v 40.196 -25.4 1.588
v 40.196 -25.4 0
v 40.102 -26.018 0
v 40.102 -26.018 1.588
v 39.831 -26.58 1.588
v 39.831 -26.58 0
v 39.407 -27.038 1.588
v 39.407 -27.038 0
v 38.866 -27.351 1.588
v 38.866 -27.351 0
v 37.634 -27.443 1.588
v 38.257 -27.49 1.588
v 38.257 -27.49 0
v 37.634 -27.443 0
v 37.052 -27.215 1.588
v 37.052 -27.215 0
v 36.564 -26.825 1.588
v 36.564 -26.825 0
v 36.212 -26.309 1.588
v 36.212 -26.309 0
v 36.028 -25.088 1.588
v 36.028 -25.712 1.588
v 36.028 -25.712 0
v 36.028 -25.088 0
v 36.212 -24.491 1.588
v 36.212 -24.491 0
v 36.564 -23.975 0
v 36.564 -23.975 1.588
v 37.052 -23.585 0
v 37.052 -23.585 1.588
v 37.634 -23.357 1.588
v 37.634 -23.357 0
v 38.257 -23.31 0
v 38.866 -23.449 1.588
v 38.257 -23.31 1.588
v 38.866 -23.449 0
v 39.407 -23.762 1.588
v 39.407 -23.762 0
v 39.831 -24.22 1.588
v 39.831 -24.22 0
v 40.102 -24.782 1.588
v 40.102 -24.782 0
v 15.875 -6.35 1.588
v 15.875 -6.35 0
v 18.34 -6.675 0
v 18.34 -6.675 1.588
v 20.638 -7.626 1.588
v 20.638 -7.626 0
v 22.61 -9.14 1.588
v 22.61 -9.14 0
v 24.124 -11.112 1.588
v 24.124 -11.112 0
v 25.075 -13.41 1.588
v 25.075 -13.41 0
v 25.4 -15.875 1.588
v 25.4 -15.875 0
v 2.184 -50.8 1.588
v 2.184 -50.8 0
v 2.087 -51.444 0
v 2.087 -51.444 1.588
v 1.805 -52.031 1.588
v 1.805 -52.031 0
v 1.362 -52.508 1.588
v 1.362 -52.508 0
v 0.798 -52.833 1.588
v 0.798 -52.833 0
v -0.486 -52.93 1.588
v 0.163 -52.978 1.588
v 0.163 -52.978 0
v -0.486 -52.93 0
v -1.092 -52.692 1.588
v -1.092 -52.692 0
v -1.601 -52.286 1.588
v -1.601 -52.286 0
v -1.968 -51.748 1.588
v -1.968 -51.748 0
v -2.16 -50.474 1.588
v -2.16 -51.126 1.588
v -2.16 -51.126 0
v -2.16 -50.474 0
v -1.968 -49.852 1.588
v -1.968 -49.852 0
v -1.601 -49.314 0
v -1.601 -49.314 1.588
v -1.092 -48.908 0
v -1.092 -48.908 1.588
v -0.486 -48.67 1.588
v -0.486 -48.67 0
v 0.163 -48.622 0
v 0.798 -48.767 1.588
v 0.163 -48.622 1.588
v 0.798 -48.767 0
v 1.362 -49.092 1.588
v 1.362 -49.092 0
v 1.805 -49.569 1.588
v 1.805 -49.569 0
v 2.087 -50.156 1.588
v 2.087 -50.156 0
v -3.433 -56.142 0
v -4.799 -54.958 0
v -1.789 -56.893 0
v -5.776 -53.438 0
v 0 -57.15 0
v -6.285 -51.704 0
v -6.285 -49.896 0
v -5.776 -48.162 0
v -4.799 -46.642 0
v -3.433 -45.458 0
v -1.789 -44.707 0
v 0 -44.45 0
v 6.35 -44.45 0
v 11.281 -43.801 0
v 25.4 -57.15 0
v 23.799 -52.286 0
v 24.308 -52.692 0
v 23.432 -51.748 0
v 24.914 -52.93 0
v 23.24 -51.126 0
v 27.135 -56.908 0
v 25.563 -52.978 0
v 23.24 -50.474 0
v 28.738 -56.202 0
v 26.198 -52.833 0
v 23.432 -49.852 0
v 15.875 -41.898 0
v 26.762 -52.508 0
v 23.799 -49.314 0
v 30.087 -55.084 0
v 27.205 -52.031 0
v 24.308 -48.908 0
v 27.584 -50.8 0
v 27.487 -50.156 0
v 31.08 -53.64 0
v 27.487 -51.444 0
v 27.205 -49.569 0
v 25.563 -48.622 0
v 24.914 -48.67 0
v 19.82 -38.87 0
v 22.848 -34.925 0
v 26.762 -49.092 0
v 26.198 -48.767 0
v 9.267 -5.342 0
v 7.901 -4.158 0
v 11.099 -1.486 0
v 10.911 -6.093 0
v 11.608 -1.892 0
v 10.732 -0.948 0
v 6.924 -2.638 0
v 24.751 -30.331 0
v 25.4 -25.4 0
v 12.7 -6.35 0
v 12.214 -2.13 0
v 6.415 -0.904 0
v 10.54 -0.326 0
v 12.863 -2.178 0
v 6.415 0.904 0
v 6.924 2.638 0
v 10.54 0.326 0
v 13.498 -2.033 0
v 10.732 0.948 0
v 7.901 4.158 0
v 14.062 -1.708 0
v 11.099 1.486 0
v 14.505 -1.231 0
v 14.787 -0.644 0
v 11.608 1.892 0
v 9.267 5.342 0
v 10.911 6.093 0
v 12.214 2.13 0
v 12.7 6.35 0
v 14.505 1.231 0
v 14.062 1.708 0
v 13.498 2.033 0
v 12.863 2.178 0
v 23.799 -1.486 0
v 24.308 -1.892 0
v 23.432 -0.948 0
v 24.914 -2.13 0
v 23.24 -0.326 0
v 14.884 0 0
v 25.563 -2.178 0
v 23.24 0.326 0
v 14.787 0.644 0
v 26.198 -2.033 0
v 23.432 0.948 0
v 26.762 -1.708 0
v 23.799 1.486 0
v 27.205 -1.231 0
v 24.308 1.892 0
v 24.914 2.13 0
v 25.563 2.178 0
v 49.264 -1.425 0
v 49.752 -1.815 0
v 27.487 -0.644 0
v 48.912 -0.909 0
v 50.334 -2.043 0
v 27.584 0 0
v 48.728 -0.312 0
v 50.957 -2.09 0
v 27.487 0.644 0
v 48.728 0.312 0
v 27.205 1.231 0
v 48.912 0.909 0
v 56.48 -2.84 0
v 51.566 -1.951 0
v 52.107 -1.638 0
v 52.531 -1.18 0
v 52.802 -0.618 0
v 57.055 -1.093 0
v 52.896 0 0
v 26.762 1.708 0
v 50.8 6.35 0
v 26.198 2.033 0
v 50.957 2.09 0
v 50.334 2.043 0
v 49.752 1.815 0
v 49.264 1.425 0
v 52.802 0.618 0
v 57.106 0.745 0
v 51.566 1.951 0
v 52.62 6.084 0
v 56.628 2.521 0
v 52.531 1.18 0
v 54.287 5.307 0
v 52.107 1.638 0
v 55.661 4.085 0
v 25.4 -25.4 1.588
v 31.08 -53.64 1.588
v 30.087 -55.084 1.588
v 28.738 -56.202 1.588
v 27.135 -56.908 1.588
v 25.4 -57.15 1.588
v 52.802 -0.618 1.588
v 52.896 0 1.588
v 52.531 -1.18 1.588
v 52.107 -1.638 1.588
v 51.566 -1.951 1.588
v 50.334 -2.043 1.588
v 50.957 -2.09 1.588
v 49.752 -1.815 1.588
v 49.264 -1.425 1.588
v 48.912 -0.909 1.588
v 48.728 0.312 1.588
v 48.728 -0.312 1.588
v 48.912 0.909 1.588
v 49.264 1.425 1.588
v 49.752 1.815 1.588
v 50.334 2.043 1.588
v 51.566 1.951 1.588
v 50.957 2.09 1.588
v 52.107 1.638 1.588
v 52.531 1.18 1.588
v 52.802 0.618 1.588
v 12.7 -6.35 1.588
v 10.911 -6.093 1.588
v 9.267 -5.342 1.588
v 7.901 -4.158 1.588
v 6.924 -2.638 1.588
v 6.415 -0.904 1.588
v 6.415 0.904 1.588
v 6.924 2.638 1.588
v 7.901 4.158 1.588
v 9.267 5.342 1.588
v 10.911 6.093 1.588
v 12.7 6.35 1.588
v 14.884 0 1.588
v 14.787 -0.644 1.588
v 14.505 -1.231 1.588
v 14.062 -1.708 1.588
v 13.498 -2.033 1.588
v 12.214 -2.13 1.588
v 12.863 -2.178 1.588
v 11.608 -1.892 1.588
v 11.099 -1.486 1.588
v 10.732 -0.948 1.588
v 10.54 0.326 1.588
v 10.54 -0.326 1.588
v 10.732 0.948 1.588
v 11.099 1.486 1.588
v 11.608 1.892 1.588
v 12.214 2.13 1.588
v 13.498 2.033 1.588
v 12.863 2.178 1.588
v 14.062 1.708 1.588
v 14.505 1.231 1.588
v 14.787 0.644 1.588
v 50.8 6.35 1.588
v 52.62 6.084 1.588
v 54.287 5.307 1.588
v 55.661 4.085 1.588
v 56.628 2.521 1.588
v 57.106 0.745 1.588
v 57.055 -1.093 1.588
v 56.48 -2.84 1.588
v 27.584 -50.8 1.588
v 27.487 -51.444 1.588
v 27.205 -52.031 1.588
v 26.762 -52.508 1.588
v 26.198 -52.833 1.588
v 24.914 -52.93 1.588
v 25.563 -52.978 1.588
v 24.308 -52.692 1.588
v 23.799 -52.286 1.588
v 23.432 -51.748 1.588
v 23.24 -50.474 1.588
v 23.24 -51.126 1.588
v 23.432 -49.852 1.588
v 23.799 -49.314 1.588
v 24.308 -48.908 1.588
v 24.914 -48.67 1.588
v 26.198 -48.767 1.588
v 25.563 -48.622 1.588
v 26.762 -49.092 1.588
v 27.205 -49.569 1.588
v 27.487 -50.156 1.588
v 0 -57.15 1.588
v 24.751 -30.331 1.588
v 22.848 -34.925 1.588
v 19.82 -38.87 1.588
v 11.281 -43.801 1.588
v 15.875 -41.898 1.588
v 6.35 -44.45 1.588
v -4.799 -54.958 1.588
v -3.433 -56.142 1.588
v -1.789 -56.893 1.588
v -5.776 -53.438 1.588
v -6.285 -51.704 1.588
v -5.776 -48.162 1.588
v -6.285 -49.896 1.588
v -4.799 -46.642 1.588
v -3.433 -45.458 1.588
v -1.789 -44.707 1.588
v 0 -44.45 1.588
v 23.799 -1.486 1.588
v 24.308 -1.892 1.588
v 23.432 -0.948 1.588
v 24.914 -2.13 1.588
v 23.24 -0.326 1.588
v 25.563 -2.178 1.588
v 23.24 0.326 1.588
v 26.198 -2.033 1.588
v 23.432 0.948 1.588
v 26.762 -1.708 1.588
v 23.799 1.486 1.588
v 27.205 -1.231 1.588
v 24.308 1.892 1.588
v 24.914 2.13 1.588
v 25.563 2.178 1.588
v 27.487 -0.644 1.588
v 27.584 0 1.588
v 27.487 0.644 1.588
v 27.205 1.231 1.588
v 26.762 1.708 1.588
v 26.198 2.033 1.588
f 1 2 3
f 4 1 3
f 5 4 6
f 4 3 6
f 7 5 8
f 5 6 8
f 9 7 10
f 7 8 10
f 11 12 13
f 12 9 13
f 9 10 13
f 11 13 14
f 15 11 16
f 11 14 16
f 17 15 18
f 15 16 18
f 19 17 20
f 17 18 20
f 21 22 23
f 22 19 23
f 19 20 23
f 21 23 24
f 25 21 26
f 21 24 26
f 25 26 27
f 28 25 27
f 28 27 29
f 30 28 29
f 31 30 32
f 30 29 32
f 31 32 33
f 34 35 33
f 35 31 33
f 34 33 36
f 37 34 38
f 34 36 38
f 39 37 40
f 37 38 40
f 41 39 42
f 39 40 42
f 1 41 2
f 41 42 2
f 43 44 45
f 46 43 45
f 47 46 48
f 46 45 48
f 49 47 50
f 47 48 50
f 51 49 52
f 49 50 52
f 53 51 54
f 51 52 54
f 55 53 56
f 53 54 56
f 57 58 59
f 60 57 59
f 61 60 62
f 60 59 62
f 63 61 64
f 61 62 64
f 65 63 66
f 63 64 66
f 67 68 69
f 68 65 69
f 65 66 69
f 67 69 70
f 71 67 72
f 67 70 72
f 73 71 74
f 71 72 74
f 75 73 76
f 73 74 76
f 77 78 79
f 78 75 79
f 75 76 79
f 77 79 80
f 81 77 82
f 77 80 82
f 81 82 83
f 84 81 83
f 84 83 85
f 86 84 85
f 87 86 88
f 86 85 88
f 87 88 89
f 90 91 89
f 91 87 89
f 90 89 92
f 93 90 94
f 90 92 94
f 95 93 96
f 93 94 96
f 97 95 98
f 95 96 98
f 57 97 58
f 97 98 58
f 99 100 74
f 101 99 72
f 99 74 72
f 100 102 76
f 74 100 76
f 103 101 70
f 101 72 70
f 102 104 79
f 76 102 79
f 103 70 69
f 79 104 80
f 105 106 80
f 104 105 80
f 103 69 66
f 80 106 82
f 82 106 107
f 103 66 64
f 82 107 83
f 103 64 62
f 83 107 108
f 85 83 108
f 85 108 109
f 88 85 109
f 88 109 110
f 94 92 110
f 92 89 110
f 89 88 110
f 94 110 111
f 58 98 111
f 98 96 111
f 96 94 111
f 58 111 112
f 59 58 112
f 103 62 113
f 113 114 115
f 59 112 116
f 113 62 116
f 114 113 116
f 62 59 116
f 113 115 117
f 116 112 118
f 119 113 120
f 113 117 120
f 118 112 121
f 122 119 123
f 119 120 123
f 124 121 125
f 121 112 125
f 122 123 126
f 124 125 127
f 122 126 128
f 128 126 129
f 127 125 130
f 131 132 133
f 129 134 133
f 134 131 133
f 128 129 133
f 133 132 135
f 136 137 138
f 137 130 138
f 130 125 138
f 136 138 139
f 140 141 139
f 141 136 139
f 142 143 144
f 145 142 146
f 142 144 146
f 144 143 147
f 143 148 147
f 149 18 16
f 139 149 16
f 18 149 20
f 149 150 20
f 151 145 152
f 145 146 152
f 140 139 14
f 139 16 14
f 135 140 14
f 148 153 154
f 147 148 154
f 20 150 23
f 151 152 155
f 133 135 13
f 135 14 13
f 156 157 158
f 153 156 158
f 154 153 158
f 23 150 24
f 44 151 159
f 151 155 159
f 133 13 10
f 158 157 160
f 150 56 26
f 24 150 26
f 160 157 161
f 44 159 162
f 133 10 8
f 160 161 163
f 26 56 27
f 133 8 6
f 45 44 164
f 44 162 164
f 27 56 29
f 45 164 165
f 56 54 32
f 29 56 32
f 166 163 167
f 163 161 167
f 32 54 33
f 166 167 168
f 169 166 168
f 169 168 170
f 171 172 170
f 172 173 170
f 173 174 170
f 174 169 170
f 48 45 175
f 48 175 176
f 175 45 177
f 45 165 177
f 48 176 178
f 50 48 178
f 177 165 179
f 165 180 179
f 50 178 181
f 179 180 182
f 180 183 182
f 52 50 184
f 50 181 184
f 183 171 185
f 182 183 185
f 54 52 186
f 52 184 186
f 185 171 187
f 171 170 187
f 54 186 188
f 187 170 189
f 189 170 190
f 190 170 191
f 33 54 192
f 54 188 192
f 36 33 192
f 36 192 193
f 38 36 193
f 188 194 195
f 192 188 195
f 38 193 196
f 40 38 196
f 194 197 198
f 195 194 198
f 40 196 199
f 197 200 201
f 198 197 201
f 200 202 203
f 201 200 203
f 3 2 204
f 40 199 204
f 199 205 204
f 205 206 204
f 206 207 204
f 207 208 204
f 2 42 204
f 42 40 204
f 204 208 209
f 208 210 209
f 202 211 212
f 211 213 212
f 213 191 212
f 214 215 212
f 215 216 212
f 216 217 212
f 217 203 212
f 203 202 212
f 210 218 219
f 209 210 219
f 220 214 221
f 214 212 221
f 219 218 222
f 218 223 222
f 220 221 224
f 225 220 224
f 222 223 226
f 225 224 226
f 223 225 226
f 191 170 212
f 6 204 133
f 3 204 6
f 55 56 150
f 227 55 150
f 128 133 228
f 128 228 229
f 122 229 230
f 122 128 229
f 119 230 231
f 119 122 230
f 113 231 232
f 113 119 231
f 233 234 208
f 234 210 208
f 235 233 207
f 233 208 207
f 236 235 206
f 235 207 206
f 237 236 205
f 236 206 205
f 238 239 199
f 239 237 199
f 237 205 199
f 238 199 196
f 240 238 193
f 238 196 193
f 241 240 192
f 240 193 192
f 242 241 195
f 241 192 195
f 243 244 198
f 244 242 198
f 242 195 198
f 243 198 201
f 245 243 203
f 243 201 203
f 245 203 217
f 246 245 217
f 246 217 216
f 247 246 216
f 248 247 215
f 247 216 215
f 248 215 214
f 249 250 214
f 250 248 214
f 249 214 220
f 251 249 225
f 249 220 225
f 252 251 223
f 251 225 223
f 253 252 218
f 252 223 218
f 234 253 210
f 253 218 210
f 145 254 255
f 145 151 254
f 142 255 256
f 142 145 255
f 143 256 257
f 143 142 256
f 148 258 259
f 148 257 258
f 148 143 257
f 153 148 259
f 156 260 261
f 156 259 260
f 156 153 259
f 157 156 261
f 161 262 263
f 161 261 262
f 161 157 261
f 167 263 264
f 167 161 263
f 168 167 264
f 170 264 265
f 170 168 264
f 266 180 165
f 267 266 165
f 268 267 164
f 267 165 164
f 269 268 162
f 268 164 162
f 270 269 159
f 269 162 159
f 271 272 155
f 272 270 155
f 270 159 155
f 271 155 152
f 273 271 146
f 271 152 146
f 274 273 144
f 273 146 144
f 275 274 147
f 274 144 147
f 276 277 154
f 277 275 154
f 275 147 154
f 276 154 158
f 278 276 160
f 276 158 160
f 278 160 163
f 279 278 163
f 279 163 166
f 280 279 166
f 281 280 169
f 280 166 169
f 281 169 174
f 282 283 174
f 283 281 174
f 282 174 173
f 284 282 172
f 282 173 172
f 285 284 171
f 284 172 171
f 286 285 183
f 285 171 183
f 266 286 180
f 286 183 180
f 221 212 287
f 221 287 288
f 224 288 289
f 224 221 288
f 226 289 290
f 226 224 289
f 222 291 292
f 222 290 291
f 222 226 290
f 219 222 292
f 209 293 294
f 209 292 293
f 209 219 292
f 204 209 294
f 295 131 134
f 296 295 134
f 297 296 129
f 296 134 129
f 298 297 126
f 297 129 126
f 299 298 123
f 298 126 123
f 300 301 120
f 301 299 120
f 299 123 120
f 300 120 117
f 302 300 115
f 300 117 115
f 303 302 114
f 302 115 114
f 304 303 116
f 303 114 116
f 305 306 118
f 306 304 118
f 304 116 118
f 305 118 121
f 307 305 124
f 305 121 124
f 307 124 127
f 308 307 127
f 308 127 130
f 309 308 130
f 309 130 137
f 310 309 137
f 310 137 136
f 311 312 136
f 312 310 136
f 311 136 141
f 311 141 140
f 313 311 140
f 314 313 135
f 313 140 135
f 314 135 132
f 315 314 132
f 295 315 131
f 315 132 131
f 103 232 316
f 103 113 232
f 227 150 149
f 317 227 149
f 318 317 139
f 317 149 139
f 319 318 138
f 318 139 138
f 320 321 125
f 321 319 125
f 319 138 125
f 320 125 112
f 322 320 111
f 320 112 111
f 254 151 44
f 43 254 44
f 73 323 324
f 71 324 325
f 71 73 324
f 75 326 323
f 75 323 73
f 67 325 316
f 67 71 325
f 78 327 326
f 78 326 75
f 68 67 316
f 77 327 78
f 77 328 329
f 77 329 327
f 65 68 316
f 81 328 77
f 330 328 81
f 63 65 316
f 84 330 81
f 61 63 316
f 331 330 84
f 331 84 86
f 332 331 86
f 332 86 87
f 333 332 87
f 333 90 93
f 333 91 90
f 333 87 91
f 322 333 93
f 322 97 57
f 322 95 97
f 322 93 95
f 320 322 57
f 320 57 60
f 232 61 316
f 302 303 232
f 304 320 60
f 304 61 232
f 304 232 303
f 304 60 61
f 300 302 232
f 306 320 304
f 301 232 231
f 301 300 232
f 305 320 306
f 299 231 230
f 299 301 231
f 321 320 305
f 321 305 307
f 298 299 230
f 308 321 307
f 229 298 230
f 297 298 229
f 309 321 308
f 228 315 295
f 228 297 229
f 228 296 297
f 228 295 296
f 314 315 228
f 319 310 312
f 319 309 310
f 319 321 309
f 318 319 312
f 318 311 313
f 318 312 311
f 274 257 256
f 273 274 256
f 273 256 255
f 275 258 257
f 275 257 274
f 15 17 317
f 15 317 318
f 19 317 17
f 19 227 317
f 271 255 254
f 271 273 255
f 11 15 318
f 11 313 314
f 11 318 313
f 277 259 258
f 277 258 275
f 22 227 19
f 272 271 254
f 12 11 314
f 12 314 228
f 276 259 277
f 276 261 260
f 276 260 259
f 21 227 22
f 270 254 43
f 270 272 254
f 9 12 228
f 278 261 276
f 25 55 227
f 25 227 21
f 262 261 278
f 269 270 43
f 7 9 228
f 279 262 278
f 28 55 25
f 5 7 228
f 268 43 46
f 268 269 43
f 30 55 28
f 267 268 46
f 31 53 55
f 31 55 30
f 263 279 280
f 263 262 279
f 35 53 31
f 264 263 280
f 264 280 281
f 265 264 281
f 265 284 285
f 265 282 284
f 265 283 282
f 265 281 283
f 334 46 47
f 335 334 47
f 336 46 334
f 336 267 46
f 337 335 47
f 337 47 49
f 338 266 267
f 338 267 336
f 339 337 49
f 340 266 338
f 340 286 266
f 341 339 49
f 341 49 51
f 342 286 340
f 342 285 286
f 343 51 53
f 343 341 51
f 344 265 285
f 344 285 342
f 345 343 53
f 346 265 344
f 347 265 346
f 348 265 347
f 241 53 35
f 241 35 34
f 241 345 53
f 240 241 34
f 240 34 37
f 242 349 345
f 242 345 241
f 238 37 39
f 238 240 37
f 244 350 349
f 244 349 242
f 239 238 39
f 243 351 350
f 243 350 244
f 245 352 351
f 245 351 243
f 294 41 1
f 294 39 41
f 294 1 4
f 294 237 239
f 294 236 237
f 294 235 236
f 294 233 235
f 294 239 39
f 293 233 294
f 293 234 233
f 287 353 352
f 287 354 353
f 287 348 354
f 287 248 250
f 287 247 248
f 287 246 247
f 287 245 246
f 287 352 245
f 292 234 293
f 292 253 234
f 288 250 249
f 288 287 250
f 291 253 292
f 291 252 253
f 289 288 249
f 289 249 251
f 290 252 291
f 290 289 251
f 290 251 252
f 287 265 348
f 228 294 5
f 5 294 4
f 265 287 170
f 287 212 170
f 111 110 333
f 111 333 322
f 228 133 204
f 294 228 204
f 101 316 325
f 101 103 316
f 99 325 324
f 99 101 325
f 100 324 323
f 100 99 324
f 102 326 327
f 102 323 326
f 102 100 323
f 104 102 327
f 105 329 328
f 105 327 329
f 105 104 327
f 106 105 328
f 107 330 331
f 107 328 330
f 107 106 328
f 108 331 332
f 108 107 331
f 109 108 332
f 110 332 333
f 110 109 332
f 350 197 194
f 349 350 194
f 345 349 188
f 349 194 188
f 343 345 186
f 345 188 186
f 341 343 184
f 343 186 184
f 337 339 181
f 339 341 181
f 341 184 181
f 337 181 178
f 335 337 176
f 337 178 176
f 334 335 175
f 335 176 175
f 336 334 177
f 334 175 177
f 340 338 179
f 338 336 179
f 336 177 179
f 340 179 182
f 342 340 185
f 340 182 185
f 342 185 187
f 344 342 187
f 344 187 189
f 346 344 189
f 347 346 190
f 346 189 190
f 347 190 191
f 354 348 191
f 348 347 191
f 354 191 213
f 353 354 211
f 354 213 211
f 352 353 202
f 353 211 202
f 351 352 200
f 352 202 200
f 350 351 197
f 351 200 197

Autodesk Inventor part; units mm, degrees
ref_plane "YZ Plane" through (0, 0, 0) normal (1, 0, 0) x (0, 1, 0)
ref_plane "XZ Plane" through (0, 0, 0) normal (0, 1, 0) x (-1, 0, 0)
ref_plane "XY Plane" through (0, 0, 0) normal (0, 0, 1) x (1, 0, 0)
sketch "main" plane through (0, 0, 0) normal (0, 0, 1) x (1, 0, 0)
  circle A0 centre (20.1733, 30.7236) radius 2.0955
  arc A1 (-24.2767, -13.7264) -> (-5.2267, 5.3236) centre (-24.2767, 5.3236) ccw
  line L0 (-5.2267, 14.8486) -> (-5.2267, 5.3236)
  line L1 (0.4529, -22.9162) -> (25.8529, 27.8838)
  arc A2 (-5.2267, 14.8486) -> (-14.7517, 24.3736) centre (-14.7517, 14.8486) ccw
  line L2 (-17.9267, 24.3736) -> (-14.7517, 24.3736)
  arc A3 (25.8529, 27.8838) -> (20.1733, 37.0736) centre (20.1733, 30.7236) ccw
  line L3 (20.1733, 37.0736) -> (-17.9267, 37.0736)
  line L4 (-30.6267, -13.7264) -> (-24.2767, -13.7264)
  circle A4 centre (-5.2267, -20.0764) radius 2.1844
  arc A5 (-5.2267, -26.4264) -> (0.4529, -22.9162) centre (-5.2267, -20.0764) ccw
  line L5 (-5.2267, -26.4264) -> (-30.6267, -26.4264)
  line L6 (-5.2267, -26.4264) -> (-30.6267, -26.4264)
  circle A6 centre (-30.6267, -20.0764) radius 2.1844
  arc A7 (-30.6267, -13.7264) -> (-30.6267, -26.4264) centre (-30.6267, -20.0764) ccw
  circle A8 centre (-5.2267, 30.7236) radius 2.1844
  circle A9 centre (7.4733, 5.3236) radius 2.0955
  arc A10 (-17.9267, 37.0736) -> (-17.9267, 24.3736) centre (-17.9267, 30.7236) ccw
  circle A11 centre (-17.9267, 30.7236) radius 2.1844
  point P0 (-10.623, 1.8831)
  point P1 (-5.2267, -13.7264)
  dimension "d0" = 12.7
  dimension "d1" = 12.7
  dimension "d2" = 4.3688
  dimension "d3" = 19.05
  dimension "d4" = 9.525
  dimension "d7" = 4.3688
  dimension "d8" = 4.191
  dimension "d10" = 4.191
sketch "Sketch1" plane through (0, 0, 0) normal (0, 0, 1) x (1, 0, 0)
  circle A0 centre (50.8, 0) radius 2.0955
  arc A1 (6.35, -44.45) -> (25.4, -25.4) centre (6.35, -25.4) ccw
  line L0 (25.4, -15.875) -> (25.4, -25.4)
  line L1 (31.0796, -53.6398) -> (56.4796, -2.8398)
  arc A2 (25.4, -15.875) -> (15.875, -6.35) centre (15.875, -15.875) ccw
  line L2 (12.7, -6.35) -> (15.875, -6.35)
  arc A3 (56.4796, -2.8398) -> (50.8, 6.35) centre (50.8, 0) ccw
  line L3 (50.8, 6.35) -> (12.7, 6.35)
  line L4 (0, -44.45) -> (6.35, -44.45)
  circle A4 centre (25.4, -50.8) radius 2.1844
  arc A5 (25.4, -57.15) -> (31.0796, -53.6398) centre (25.4, -50.8) ccw
  line L5 (25.4, -57.15) -> (0, -57.15)
  line L6 (25.4, -57.15) -> (0, -57.15)
  circle A6 centre (0, -50.8) radius 2.1844
  arc A7 (0, -44.45) -> (0, -57.15) centre (0, -50.8) ccw
  circle A8 centre (25.4, 0) radius 2.1844
  circle A9 centre (38.1, -25.4) radius 2.0955
  arc A10 (12.7, 6.35) -> (12.7, -6.35) centre (12.7, 0) ccw
  circle A11 centre (12.7, 0) radius 2.1844
  point P0 (0, 0)
extrude "Extrusion1" add sketch "Sketch1" along normal blind 1.5875
properties part number "gusset" material "Acetal Resin, White"
